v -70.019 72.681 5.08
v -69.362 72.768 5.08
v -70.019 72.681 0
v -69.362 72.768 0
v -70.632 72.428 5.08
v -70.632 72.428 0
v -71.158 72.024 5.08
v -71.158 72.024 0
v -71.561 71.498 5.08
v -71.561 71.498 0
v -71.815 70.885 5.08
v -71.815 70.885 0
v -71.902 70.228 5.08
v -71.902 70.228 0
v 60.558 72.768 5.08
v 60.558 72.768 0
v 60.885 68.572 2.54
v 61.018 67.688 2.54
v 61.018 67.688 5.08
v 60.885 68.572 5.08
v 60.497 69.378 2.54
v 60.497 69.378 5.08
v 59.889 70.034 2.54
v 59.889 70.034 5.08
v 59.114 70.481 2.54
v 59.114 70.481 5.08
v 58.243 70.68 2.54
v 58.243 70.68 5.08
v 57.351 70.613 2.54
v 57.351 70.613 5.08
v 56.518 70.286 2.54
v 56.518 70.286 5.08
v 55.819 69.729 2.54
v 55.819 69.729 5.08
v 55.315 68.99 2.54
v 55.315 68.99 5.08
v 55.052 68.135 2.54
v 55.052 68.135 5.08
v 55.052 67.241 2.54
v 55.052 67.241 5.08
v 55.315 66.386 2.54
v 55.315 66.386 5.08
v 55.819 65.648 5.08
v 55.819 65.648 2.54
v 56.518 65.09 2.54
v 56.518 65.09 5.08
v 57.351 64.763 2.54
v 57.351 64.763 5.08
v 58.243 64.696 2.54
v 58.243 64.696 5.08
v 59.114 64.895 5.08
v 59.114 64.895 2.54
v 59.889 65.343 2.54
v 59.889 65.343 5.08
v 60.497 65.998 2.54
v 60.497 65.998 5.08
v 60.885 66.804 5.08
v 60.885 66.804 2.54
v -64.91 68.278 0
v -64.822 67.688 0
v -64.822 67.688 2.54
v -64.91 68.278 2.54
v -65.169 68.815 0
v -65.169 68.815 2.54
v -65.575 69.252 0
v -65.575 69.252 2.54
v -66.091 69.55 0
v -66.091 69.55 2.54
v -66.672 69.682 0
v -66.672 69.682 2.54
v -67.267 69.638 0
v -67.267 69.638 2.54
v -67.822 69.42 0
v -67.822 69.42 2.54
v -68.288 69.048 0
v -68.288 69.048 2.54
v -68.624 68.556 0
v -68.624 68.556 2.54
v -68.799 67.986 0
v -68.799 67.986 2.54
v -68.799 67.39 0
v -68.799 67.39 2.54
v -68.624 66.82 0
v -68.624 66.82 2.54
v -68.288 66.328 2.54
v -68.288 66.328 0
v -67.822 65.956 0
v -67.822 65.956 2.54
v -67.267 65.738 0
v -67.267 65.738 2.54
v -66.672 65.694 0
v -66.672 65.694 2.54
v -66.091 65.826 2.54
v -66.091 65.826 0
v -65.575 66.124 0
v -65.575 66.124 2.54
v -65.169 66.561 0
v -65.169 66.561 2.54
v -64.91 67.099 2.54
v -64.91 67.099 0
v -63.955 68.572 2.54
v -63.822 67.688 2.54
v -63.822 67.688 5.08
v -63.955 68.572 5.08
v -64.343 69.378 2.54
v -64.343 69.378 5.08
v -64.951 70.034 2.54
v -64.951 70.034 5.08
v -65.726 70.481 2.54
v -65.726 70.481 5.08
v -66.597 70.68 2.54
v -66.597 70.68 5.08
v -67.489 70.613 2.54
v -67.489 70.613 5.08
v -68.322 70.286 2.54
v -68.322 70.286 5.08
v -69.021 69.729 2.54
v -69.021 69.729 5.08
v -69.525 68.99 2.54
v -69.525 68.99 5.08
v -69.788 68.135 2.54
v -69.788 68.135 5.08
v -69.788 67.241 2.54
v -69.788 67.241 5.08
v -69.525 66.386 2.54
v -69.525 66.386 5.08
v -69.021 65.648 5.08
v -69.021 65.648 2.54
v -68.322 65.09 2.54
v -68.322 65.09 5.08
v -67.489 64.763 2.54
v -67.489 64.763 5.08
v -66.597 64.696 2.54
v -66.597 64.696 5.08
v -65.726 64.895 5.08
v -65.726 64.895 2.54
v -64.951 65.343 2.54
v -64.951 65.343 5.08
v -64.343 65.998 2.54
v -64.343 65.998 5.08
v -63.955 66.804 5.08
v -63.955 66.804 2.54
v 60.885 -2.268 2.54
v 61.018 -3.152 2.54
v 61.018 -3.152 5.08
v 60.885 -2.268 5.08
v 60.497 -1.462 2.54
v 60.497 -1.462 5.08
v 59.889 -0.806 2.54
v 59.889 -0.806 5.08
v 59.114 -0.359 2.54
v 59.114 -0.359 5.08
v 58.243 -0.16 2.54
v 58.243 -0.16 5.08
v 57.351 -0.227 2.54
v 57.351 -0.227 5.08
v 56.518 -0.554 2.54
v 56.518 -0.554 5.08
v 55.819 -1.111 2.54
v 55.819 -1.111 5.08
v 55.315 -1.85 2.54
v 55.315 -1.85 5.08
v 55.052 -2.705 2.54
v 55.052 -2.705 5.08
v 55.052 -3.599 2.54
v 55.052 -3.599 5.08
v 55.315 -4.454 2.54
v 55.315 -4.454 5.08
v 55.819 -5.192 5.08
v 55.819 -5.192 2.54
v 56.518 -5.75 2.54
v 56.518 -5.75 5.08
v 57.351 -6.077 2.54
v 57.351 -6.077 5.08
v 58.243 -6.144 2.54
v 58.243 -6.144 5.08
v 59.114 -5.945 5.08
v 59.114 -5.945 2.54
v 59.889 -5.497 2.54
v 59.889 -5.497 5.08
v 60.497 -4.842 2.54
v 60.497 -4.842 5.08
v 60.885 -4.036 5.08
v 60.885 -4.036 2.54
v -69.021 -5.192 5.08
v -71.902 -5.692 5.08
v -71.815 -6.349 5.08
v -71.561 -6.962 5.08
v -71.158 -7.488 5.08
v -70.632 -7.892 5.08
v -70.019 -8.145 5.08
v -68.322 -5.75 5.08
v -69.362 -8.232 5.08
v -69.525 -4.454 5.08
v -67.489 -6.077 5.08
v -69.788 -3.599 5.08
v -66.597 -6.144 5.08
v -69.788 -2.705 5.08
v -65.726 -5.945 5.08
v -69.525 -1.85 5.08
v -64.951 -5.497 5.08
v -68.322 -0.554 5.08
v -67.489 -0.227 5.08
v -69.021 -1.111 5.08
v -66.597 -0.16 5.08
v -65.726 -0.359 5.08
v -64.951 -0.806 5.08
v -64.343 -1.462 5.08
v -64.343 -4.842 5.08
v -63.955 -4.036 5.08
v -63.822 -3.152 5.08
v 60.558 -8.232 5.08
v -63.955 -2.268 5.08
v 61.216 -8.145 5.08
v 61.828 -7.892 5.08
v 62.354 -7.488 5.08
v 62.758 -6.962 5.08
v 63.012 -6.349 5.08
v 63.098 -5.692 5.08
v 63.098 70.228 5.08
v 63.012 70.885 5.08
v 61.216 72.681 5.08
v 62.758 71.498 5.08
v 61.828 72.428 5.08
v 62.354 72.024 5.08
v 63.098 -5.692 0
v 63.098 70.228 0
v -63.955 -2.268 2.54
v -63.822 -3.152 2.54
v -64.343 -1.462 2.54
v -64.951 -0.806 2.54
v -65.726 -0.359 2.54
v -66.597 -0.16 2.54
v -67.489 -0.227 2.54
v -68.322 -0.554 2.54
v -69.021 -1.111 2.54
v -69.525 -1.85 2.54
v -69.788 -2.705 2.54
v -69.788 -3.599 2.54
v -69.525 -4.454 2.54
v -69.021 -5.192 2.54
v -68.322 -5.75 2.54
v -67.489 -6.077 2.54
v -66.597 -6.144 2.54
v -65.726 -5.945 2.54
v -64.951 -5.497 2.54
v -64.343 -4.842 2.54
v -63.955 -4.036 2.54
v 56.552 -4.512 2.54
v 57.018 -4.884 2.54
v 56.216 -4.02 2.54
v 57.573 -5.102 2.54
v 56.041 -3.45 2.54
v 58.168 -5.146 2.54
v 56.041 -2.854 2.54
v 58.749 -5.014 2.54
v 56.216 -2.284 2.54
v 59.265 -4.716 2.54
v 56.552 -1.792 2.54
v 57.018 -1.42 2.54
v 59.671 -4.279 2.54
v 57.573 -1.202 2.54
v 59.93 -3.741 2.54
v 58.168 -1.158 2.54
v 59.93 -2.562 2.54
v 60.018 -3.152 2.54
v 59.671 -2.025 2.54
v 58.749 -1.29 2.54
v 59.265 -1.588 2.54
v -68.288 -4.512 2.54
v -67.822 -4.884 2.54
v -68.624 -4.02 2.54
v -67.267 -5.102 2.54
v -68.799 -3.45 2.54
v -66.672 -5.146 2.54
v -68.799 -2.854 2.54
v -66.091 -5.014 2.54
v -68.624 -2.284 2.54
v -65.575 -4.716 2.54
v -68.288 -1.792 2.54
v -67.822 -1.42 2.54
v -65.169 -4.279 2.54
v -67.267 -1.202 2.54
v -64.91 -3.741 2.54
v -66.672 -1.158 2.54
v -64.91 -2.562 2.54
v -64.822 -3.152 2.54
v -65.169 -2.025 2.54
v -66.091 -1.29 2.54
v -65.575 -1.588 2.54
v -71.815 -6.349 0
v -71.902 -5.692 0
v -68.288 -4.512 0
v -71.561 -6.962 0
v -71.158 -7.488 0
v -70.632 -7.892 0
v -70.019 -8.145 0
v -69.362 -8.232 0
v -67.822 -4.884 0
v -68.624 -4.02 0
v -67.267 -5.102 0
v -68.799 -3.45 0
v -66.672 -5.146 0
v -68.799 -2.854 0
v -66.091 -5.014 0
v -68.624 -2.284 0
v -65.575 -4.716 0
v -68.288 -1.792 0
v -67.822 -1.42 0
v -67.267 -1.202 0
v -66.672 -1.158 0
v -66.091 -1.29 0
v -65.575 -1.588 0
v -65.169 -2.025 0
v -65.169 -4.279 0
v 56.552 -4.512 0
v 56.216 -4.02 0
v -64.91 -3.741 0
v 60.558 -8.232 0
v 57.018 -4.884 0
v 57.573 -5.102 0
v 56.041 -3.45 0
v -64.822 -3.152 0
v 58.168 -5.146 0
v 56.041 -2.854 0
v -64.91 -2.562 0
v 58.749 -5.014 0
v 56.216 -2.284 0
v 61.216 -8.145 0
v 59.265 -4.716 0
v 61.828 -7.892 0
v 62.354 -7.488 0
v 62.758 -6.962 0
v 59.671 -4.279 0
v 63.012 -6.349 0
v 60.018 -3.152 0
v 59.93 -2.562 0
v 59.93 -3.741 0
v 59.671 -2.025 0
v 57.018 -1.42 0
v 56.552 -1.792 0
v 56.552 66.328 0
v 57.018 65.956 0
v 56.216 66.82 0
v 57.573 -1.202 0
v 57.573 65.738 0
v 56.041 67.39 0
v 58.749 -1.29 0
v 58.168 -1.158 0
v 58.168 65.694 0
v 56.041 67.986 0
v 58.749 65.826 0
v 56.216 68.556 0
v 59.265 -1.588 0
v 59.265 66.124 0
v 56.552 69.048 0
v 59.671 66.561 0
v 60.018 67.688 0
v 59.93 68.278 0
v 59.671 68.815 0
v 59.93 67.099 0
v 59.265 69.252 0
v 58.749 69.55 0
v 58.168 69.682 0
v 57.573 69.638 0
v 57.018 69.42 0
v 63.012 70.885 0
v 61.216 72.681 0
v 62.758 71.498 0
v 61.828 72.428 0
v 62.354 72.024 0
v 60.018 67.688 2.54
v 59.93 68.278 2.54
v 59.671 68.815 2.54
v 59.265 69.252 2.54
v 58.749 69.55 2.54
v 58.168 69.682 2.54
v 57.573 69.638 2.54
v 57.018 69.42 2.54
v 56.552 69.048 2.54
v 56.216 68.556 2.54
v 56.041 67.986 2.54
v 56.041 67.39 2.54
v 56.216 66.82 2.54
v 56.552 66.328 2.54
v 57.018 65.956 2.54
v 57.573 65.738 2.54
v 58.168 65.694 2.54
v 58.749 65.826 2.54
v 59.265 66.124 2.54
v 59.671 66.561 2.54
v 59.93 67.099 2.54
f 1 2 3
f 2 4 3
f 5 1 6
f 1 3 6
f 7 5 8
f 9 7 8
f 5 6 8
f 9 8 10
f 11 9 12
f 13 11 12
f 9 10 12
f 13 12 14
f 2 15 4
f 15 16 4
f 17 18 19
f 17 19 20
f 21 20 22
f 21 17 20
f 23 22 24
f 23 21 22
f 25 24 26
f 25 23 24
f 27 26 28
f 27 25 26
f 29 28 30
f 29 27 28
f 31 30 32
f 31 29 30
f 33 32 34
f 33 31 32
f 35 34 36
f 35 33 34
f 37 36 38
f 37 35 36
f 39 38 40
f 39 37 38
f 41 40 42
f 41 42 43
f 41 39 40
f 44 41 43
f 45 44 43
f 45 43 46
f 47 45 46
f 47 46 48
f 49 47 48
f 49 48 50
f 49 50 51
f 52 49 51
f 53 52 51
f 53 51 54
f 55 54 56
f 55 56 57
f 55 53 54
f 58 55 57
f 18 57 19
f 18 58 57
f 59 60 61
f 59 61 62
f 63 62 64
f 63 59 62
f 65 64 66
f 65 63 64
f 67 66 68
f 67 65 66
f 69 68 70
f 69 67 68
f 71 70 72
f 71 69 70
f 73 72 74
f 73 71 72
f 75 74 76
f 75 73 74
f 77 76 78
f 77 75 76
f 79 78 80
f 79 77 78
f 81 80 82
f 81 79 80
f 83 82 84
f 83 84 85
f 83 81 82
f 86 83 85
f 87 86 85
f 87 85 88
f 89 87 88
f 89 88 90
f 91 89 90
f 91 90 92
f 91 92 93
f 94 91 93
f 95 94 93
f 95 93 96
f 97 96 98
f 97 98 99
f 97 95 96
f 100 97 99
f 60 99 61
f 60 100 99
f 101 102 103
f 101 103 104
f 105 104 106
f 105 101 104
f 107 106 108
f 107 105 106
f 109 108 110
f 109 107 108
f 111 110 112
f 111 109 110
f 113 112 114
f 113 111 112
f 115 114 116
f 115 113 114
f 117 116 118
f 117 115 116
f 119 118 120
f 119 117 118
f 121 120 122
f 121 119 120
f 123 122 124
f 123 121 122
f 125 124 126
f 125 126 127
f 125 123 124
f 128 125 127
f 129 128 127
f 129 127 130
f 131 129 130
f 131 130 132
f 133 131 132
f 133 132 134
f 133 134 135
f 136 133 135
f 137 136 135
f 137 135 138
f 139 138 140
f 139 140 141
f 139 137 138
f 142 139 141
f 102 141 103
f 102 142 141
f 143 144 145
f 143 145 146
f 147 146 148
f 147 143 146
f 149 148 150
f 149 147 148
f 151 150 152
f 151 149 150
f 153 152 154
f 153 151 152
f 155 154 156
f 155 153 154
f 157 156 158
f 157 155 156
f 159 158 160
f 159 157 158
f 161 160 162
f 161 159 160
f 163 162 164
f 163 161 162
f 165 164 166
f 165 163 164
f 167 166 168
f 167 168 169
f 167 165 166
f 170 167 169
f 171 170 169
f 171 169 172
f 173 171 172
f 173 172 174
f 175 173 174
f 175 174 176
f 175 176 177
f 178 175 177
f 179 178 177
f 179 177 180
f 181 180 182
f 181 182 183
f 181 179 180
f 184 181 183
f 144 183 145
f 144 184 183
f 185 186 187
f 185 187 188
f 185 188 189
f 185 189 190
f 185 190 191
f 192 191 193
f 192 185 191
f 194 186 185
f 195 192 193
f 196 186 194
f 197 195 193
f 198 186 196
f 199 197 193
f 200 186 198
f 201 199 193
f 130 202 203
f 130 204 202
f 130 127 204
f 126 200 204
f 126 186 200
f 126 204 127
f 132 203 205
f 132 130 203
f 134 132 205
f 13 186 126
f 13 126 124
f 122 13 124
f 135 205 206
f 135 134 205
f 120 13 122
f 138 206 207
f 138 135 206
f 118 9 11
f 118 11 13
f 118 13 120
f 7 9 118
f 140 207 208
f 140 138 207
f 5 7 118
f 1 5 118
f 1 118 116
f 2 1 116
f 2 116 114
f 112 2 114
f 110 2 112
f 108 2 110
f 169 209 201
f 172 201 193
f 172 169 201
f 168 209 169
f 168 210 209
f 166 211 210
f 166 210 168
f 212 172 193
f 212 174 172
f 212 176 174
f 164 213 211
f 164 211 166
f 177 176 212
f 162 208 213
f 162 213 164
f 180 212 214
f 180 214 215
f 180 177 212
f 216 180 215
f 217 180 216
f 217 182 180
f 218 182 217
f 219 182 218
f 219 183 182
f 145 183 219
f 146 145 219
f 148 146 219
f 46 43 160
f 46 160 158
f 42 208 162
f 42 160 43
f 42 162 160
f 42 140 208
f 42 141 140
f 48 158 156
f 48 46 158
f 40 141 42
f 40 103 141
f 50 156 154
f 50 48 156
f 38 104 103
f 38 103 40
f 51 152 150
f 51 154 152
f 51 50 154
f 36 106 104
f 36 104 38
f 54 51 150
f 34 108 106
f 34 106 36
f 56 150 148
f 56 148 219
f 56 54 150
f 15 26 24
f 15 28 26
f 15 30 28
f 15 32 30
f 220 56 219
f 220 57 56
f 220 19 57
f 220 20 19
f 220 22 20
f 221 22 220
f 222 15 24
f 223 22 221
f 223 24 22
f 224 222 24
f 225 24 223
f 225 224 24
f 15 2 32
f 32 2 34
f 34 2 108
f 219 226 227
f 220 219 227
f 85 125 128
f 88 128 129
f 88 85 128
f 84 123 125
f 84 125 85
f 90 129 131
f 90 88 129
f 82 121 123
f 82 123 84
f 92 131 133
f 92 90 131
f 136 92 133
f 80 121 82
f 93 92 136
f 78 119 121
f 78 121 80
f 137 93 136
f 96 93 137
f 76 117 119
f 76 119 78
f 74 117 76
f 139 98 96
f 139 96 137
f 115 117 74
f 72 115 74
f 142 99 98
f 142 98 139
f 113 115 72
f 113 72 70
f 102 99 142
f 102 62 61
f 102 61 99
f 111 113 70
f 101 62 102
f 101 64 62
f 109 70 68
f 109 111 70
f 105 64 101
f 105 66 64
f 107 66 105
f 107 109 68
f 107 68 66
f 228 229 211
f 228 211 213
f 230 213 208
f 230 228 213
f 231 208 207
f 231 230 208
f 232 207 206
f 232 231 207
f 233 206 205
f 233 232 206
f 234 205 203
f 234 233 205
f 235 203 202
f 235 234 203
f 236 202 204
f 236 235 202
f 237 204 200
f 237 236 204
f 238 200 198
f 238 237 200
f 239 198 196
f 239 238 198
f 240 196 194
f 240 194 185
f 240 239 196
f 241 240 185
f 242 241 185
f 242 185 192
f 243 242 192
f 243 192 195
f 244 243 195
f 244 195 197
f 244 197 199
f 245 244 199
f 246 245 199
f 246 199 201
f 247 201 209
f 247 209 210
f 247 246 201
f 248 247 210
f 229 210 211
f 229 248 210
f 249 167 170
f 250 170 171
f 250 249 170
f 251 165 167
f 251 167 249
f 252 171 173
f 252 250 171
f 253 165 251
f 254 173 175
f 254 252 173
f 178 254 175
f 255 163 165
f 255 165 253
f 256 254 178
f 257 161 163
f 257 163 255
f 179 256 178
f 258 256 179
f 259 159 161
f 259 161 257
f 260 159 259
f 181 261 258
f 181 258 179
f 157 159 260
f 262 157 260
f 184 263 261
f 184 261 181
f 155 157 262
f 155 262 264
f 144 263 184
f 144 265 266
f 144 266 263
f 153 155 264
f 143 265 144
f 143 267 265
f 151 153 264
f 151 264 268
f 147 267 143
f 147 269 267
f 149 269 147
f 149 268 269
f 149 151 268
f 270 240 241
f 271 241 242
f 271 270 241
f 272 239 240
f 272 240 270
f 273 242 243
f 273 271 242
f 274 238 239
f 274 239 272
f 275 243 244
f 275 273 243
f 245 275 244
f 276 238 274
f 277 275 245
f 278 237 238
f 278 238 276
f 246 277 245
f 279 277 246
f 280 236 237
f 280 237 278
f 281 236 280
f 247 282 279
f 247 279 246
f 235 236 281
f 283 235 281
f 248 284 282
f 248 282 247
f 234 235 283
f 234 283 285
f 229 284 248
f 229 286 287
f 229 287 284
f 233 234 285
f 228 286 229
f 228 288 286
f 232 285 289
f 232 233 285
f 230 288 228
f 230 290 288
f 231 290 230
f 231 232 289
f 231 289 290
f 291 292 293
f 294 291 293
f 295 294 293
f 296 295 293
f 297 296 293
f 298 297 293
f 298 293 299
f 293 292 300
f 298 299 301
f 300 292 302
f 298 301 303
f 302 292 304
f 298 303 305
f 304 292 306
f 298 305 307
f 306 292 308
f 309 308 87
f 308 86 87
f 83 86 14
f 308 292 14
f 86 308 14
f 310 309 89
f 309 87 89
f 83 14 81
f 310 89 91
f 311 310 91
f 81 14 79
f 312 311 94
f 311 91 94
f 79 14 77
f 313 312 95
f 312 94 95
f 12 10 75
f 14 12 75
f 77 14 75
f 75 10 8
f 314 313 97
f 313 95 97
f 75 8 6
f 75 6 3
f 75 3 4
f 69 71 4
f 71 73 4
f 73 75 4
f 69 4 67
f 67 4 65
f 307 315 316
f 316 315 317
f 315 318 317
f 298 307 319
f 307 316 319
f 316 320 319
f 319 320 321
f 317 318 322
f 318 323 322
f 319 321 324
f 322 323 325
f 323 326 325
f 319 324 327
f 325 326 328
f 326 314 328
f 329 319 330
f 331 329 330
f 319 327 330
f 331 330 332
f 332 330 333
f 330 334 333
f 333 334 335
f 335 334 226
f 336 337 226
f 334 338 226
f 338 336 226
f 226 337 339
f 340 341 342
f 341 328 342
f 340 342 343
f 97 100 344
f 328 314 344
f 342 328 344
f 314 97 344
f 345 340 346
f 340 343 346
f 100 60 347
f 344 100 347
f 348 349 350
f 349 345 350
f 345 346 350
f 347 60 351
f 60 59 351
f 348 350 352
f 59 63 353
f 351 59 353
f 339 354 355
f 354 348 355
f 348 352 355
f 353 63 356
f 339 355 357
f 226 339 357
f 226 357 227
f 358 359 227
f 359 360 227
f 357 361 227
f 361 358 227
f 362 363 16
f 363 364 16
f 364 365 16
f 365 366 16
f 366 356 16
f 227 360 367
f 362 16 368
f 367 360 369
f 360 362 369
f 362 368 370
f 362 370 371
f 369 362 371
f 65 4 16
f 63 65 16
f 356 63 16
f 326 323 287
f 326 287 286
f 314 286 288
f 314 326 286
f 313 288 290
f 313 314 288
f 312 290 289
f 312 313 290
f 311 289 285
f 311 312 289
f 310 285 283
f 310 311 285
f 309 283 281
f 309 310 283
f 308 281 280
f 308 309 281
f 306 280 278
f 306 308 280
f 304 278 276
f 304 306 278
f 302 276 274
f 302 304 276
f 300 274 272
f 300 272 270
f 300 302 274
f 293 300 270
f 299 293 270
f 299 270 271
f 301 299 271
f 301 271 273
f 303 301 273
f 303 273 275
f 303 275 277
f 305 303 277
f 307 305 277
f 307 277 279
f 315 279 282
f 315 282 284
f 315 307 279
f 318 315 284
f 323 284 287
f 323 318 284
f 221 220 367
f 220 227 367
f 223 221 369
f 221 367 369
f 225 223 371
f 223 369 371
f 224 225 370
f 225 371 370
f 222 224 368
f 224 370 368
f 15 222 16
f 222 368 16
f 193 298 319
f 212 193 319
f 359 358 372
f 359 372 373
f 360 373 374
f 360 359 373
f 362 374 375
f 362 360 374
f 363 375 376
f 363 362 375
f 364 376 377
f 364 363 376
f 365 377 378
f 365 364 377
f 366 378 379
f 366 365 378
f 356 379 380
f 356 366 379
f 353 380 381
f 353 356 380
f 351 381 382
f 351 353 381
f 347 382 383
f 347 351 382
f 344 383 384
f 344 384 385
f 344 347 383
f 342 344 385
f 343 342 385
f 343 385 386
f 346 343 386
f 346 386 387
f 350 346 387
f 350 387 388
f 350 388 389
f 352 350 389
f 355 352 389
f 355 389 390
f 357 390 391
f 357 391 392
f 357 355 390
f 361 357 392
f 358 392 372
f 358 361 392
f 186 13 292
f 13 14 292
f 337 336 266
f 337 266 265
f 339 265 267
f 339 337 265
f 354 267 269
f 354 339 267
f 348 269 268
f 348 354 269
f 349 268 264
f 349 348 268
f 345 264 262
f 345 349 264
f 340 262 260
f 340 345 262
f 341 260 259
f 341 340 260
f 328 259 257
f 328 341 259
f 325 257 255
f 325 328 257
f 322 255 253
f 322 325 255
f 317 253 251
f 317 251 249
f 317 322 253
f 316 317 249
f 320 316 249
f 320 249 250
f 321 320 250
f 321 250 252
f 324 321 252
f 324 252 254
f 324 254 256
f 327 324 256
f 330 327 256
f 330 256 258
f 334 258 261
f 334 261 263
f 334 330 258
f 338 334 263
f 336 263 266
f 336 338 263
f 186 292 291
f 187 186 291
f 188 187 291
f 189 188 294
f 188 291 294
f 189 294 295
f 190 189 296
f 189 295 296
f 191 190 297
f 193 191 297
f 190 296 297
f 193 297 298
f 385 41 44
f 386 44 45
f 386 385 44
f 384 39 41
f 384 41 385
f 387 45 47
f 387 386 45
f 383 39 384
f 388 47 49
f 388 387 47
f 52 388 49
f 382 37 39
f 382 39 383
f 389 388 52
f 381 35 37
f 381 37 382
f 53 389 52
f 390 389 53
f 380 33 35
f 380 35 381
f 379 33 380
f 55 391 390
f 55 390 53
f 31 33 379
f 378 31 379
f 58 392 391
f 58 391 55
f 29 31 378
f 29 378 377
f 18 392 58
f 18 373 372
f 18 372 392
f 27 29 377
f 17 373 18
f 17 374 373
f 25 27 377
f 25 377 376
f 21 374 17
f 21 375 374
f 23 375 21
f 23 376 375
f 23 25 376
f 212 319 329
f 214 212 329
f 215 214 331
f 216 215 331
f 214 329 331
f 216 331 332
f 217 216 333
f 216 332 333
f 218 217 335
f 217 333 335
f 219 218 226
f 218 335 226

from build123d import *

# Parameters (mm, degrees)
SKETCH1_R           = 2
SKETCH1_W           = 2.5
SKETCH1_H           = 2.794
BOSS_EXTRUDE1_DEPTH = 2.54
SKETCH3_R           = 3
BOSS_EXTRUDE2_DEPTH = 2.54


with BuildPart() as part:
    # Sketch1 → Boss-Extrude1 (new body)
    # profile 1 of 3: a face of its own
    with BuildSketch(Plane.XY):
        with BuildLine():
            Line((-71.901625411, 70.228037055), (-71.901625411, 23.565037055))
            Line((-71.901625411, 23.565037055), (-69.401625411, 23.565037055))
            Line((-69.401625411, 23.565037055), (-69.401625411, 55.378037055))
            ThreePointArc((-69.401625411, 55.378037055), (-66.797804696, 61.66421634), (-60.511625411, 64.268037055))
            Line((-60.511625411, 64.268037055), (26.708374589, 64.268037055))
            ThreePointArc((26.708374589, 64.268037055), (32.994553874, 61.66421634), (35.598374589, 55.378037055))
            Line((35.598374589, 55.378037055), (35.598374589, 8.158037055))
            ThreePointArc((35.598374589, 8.158037055), (32.994553874, 1.871857771), (26.708374589, -0.731962945))
            Line((26.708374589, -0.731962945), (-60.511625411, -0.731962945))
            ThreePointArc((-60.511625411, -0.731962945), (-66.797804696, 1.871857771), (-69.401625411, 8.158037055))
            Line((-69.401625411, 8.158037055), (-69.401625411, 20.771037055))
            Line((-69.401625411, 20.771037055), (-71.901625411, 20.771037055))
            Line((-71.901625411, 20.771037055), (-71.901625411, -5.691962945))
            ThreePointArc((-71.901625411, -5.691962945), (-71.157676635, -7.488014169), (-69.361625411, -8.231962945))
            Line((-69.361625411, -8.231962945), (60.558374589, -8.231962945))
            ThreePointArc((60.558374589, -8.231962945), (62.354425813, -7.488014169), (63.098374589, -5.691962945))
            Line((63.098374589, -5.691962945), (63.098374589, 70.228037055))
            ThreePointArc((63.098374589, 70.228037055), (62.354425813, 72.024088279), (60.558374589, 72.768037055))
            Line((60.558374589, 72.768037055), (-69.361625411, 72.768037055))
            ThreePointArc((-69.361625411, 72.768037055), (-71.157676635, 72.024088279), (-71.901625411, 70.228037055))
        make_face()
        with Locations((-66.821625411, -3.151962945)):
            Circle(SKETCH1_R, mode=Mode.SUBTRACT)
        with Locations((58.018374589, -3.151962945)):
            Circle(SKETCH1_R, mode=Mode.SUBTRACT)
        with Locations((-66.821625411, 67.688037055)):
            Circle(SKETCH1_R, mode=Mode.SUBTRACT)
        with Locations((58.018374589, 67.688037055)):
            Circle(SKETCH1_R, mode=Mode.SUBTRACT)
    # profile 2 of 3: a face of its own
    with BuildSketch(Plane.XY):
        with Locations((-70.651625411, 22.168037055)):
            Rectangle(SKETCH1_W, SKETCH1_H)
    # profile 3 of 3: a face of its own
    with BuildSketch(Plane.XY):
        with BuildLine():
            Line((-69.401625411, 55.378037055), (-69.401625411, 23.565037055))
            Line((-69.401625411, 23.565037055), (-69.401625411, 20.771037055))
            Line((-69.401625411, 20.771037055), (-69.401625411, 8.158037055))
            ThreePointArc((-69.401625411, 8.158037055), (-66.797804696, 1.871857771), (-60.511625411, -0.731962945))
            Line((-60.511625411, -0.731962945), (26.708374589, -0.731962945))
            ThreePointArc((26.708374589, -0.731962945), (32.994553874, 1.871857771), (35.598374589, 8.158037055))
            Line((35.598374589, 8.158037055), (35.598374589, 55.378037055))
            ThreePointArc((35.598374589, 55.378037055), (32.994553874, 61.66421634), (26.708374589, 64.268037055))
            Line((26.708374589, 64.268037055), (-60.511625411, 64.268037055))
            ThreePointArc((-60.511625411, 64.268037055), (-66.797804696, 61.66421634), (-69.401625411, 55.378037055))
        make_face()
    extrude(amount=BOSS_EXTRUDE1_DEPTH)

    # Sketch3 → Boss-Extrude2 (add)
    with BuildSketch(Plane.XY.offset(2.54)):
        with BuildLine():
            Line((63.098374589, -5.691962945), (63.098374589, 70.228037055))
            ThreePointArc((63.098374589, 70.228037055), (62.354425813, 72.024088279), (60.558374589, 72.768037055))
            Line((60.558374589, 72.768037055), (-69.361625411, 72.768037055))
            ThreePointArc((-69.361625411, 72.768037055), (-71.157676635, 72.024088279), (-71.901625411, 70.228037055))
            Line((-71.901625411, 70.228037055), (-71.901625411, -5.691962945))
            ThreePointArc((-71.901625411, -5.691962945), (-71.157676635, -7.488014169), (-69.361625411, -8.231962945))
            Line((-69.361625411, -8.231962945), (60.558374589, -8.231962945))
            ThreePointArc((60.558374589, -8.231962945), (62.354425813, -7.488014169), (63.098374589, -5.691962945))
        make_face()
        with Locations((-66.821625411, -3.151962945)):
            Circle(SKETCH3_R, mode=Mode.SUBTRACT)
        with Locations((58.018374589, -3.151962945)):
            Circle(SKETCH3_R, mode=Mode.SUBTRACT)
        with Locations((58.018374589, 67.688037055)):
            Circle(SKETCH3_R, mode=Mode.SUBTRACT)
        with Locations((-66.821625411, 67.688037055)):
            Circle(SKETCH3_R, mode=Mode.SUBTRACT)
    extrude(amount=BOSS_EXTRUDE2_DEPTH)


solid = part.part
